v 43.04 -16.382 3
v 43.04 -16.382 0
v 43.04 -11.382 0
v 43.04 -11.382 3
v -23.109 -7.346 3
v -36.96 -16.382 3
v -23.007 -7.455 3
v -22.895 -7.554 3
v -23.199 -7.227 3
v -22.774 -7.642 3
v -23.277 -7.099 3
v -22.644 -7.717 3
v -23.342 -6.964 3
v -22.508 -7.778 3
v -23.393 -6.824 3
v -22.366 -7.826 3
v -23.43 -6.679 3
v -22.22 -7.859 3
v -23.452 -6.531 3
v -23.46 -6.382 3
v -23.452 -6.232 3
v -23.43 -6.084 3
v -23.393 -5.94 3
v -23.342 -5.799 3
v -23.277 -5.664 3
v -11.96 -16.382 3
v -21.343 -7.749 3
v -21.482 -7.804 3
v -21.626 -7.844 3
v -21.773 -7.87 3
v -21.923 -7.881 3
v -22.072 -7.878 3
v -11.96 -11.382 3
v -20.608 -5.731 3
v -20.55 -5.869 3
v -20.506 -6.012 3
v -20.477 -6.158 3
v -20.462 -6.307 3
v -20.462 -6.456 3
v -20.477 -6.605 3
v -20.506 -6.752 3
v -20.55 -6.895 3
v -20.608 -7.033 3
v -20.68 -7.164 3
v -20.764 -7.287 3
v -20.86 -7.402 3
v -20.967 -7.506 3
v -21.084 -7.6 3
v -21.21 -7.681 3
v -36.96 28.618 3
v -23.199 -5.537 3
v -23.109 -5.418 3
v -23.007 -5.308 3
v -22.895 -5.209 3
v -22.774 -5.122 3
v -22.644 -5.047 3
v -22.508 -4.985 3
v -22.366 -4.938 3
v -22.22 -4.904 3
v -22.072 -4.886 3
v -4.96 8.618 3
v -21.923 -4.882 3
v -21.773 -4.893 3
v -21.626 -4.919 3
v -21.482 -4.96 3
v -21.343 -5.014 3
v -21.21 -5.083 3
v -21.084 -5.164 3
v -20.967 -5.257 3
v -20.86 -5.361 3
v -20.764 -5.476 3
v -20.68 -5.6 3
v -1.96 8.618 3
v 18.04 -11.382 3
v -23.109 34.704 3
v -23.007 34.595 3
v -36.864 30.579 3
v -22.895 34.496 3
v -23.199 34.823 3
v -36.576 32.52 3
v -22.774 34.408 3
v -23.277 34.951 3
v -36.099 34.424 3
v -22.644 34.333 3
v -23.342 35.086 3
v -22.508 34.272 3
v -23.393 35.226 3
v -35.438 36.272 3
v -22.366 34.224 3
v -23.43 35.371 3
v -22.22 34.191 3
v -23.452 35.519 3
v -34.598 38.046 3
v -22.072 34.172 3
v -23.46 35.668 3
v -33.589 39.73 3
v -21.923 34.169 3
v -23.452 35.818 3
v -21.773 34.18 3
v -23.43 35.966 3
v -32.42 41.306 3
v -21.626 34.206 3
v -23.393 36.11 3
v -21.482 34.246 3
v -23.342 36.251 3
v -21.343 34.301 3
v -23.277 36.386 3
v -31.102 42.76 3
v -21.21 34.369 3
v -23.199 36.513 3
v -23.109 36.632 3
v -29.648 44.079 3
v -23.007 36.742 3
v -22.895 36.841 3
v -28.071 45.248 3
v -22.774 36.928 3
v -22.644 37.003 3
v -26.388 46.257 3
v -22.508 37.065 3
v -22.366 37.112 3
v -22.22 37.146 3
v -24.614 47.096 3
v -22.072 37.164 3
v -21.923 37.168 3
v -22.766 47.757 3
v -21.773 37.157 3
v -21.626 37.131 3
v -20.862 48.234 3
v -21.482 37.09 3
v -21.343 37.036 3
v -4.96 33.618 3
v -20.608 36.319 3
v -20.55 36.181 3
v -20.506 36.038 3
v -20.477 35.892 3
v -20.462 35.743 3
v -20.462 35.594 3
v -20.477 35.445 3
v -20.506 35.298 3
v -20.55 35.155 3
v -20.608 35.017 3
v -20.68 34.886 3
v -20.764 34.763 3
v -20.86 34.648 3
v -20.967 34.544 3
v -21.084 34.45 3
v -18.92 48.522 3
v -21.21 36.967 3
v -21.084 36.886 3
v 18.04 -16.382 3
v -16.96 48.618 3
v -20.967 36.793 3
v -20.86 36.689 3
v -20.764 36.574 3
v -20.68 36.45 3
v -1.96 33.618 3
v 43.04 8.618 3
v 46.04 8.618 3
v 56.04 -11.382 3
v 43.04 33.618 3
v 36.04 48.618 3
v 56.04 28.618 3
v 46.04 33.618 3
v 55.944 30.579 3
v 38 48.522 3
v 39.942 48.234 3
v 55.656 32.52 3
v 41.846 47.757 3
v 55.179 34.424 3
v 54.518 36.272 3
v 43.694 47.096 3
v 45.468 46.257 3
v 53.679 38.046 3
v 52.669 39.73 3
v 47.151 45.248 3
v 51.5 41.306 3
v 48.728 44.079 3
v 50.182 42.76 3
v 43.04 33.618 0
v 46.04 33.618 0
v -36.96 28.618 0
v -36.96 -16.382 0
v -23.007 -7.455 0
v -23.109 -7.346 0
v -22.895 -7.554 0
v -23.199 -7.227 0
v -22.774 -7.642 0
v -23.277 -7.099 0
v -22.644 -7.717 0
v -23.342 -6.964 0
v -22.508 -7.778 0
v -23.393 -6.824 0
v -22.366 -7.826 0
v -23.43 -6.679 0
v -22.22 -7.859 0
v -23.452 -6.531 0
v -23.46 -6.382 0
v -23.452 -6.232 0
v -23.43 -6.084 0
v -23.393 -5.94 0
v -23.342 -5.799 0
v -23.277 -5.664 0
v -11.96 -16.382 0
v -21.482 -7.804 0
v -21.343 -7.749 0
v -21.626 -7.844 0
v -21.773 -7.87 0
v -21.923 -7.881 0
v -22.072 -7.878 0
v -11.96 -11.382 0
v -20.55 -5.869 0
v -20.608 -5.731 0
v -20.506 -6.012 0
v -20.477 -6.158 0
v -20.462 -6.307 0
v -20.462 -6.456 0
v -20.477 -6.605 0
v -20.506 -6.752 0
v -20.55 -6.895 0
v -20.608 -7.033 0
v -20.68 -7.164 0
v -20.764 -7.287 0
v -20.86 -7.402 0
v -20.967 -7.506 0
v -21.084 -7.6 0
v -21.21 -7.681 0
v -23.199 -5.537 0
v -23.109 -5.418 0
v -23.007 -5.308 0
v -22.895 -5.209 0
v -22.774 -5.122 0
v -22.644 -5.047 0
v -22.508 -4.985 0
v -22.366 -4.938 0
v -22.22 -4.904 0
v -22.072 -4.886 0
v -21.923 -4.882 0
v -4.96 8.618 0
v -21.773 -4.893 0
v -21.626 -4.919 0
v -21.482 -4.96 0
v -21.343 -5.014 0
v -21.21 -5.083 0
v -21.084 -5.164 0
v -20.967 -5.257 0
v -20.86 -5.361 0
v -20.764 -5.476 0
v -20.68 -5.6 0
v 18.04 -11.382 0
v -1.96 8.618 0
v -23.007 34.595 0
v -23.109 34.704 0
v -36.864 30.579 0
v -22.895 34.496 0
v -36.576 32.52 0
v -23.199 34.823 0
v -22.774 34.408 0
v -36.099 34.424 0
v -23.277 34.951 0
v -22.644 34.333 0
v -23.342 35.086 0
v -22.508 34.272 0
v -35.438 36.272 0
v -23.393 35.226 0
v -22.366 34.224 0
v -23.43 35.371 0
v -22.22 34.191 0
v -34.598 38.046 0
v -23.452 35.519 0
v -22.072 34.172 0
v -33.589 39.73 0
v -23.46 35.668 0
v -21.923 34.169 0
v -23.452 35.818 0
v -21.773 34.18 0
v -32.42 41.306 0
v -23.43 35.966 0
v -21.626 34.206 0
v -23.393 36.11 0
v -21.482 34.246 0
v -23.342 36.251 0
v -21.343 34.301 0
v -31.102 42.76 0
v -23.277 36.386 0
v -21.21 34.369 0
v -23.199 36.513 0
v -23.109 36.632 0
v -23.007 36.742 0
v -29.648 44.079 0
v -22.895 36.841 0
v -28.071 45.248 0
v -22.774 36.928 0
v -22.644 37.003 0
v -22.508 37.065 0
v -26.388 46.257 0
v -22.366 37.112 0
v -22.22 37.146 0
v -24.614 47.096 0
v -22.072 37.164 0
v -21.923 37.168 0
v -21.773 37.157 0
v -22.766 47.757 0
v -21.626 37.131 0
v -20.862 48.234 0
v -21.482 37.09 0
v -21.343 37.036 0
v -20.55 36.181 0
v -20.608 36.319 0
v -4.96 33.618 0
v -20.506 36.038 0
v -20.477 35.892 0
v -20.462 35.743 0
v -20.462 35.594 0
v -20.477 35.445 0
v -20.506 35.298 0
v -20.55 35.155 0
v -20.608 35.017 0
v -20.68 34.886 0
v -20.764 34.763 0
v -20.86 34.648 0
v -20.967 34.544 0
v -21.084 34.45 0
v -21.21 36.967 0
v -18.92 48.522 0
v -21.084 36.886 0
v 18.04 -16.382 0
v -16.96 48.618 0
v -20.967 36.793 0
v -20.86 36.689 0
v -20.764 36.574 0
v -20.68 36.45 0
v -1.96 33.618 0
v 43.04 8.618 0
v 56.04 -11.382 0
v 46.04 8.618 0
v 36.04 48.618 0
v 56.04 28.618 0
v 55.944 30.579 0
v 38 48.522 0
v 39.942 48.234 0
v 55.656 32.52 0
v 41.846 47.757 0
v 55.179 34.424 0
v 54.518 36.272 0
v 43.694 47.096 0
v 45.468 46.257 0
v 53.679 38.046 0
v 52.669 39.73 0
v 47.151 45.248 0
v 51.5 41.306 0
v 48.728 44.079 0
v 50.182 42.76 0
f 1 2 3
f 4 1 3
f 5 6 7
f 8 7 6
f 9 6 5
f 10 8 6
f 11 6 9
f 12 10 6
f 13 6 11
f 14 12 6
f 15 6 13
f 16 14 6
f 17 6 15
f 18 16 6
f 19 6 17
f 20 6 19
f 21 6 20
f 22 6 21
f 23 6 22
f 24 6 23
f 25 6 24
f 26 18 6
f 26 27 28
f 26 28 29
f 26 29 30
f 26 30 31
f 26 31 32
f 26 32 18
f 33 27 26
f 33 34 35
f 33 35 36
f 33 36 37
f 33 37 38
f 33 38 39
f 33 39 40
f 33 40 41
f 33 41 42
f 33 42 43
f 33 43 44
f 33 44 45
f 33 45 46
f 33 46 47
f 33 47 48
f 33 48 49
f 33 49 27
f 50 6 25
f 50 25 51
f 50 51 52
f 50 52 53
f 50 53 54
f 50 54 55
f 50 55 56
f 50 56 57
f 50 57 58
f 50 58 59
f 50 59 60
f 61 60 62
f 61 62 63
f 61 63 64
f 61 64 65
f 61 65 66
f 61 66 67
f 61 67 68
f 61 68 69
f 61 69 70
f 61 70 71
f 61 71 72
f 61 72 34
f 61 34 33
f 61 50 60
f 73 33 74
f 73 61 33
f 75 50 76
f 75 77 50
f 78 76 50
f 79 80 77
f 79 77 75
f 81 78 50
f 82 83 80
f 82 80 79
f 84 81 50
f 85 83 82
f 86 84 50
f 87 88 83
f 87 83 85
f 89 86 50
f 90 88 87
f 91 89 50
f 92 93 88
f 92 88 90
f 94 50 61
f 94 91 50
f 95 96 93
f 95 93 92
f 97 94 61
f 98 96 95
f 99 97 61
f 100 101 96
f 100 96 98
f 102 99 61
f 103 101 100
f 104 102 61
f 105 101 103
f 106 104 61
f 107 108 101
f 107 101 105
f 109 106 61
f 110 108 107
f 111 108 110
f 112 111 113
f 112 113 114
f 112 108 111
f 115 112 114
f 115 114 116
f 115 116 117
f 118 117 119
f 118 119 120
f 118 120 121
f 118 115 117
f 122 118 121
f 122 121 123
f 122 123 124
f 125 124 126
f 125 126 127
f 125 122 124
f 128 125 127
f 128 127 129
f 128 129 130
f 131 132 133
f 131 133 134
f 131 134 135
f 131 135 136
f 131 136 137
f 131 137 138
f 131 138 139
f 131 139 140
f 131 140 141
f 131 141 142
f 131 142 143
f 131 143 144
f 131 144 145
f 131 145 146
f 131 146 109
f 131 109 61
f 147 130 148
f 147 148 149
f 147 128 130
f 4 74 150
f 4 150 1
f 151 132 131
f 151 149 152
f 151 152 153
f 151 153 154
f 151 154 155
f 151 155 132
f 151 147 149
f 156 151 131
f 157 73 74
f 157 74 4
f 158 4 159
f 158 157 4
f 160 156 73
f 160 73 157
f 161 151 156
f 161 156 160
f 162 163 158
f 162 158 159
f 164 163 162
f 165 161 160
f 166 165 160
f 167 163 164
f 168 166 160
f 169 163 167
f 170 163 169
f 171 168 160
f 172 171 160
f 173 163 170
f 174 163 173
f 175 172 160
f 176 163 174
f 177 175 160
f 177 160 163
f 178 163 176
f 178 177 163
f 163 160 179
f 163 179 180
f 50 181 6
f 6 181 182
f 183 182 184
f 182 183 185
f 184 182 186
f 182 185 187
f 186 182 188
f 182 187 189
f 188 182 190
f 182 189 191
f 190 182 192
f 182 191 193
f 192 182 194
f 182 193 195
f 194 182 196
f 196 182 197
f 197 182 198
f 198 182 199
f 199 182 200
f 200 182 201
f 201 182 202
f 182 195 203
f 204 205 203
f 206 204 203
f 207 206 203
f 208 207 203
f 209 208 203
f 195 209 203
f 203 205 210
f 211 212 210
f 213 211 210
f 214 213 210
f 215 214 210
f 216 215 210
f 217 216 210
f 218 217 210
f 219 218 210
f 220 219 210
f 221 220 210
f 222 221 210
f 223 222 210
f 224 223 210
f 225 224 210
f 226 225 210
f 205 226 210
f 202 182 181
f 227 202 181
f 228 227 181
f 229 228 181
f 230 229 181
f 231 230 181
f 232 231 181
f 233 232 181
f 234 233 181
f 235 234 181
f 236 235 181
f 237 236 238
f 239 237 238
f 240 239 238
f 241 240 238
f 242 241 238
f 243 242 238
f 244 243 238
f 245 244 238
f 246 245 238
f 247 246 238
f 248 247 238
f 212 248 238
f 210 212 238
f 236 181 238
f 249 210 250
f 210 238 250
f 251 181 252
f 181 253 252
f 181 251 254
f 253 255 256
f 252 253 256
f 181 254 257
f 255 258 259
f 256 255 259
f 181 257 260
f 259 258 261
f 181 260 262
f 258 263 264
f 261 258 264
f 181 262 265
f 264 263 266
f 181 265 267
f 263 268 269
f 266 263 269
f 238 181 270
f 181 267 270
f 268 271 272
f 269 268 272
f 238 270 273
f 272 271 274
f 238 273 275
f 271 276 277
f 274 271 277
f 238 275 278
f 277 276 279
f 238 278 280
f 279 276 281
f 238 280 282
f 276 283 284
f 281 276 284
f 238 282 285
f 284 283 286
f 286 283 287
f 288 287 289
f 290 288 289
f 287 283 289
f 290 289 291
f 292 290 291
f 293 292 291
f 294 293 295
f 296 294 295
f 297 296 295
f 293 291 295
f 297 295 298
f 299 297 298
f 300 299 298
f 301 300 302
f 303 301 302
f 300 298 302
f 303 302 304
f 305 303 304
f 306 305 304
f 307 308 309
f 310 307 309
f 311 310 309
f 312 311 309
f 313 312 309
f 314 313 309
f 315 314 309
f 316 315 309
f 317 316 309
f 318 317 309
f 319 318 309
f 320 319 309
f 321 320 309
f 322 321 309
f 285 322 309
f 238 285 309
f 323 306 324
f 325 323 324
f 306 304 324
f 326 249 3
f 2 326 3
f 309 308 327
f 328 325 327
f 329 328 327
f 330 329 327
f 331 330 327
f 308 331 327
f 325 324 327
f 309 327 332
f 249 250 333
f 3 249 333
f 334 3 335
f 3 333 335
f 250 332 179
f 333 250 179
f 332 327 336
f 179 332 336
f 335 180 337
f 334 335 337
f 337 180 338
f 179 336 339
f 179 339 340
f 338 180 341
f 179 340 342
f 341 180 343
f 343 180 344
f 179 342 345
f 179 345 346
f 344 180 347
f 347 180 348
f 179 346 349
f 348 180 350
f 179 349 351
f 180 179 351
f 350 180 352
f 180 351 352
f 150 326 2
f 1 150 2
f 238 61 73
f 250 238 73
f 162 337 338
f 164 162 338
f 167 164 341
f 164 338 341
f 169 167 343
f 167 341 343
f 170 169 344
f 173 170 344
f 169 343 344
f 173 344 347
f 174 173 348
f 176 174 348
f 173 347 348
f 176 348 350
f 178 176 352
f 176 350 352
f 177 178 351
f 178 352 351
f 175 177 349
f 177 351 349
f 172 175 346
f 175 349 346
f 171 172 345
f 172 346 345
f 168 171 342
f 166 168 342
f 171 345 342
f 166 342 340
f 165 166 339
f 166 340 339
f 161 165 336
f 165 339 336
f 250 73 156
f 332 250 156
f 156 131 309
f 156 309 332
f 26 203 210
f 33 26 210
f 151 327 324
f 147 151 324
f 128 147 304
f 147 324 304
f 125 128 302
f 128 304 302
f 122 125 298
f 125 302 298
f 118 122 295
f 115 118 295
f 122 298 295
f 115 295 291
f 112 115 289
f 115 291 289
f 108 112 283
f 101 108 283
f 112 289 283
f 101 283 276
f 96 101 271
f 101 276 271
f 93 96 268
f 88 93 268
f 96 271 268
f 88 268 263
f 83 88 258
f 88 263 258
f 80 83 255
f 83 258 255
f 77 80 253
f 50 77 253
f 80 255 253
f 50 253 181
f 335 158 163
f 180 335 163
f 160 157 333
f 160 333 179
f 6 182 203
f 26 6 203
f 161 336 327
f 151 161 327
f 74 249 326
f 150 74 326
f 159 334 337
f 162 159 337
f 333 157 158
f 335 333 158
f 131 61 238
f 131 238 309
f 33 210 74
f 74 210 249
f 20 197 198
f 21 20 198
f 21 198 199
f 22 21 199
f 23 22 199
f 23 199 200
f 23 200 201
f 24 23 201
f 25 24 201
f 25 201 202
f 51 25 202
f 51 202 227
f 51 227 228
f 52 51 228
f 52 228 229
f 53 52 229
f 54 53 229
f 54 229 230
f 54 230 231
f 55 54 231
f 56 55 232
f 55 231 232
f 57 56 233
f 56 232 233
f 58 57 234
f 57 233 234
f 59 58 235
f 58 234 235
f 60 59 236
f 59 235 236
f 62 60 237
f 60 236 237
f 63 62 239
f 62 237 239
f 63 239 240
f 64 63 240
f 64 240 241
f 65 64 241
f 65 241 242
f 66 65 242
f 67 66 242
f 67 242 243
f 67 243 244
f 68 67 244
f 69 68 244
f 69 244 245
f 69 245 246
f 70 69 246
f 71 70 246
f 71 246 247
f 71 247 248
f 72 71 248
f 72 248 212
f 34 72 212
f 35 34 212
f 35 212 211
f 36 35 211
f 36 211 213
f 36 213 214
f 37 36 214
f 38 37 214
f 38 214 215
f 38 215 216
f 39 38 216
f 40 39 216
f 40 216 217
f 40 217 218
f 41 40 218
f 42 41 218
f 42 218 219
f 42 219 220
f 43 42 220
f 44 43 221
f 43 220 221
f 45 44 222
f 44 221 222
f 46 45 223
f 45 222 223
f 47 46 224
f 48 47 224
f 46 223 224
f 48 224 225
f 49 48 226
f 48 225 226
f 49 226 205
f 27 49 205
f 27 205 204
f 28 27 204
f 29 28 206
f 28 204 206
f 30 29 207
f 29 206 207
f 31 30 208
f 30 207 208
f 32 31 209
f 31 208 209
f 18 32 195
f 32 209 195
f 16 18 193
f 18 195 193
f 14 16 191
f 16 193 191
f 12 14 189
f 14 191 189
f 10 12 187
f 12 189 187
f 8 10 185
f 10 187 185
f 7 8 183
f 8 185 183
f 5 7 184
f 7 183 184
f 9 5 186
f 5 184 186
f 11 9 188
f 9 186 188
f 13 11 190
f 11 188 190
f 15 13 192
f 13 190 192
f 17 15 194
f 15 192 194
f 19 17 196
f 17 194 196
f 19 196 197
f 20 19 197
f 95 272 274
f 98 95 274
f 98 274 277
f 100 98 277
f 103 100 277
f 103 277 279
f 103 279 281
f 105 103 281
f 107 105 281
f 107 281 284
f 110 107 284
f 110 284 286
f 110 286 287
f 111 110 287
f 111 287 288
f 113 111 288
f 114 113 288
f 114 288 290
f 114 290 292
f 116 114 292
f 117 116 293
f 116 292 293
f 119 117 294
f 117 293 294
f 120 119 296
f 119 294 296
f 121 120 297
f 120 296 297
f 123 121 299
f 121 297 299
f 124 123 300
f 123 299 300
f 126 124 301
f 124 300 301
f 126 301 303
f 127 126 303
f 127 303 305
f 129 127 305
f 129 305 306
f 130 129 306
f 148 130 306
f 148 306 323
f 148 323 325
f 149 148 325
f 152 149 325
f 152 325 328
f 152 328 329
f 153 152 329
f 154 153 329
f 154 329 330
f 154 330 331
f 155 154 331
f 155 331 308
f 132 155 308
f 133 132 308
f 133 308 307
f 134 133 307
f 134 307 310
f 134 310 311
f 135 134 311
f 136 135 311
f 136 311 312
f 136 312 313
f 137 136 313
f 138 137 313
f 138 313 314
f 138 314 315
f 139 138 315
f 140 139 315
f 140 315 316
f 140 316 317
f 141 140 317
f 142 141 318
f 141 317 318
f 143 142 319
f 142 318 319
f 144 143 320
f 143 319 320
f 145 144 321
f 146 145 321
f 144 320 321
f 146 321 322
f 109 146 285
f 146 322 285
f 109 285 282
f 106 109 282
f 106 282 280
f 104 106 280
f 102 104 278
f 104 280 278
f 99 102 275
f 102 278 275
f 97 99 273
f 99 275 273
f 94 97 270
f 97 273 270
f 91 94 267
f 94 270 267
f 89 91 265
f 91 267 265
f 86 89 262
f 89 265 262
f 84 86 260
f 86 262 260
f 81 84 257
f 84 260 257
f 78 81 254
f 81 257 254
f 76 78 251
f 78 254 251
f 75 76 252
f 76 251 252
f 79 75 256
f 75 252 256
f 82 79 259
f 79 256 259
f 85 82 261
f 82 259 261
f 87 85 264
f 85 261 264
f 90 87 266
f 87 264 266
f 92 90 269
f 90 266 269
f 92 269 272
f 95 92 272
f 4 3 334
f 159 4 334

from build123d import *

# Parameters (mm, degrees)
RESSALTO_EXTRUS_O1_DEPTH = 3
ESBO_O2_R                = 1.5
CORTE_EXTRUS_O1_DEPTH    = 10
ESBO_O3_W                = 3
ESBO_O3_H                = 25
CORTE_EXTRUS_O2_DEPTH    = 10


with BuildPart() as part:
    # Esboço1 → Ressalto-extrusão1 (new body)
    with BuildSketch(Plane.XY):
        with BuildLine():
            Line((43.040081042, -11.381695114), (56.040081042, -11.381695114))
            Line((56.040081042, -11.381695114), (56.040081042, 28.618304886))
            ThreePointArc((56.040081042, 28.618304886), (50.182216666, 42.76044051), (36.040081042, 48.618304886))
            Line((36.040081042, 48.618304886), (-16.959918958, 48.618304886))
            ThreePointArc((-16.959918958, 48.618304886), (-31.102054581, 42.76044051), (-36.959918958, 28.618304886))
            Line((-36.959918958, 28.618304886), (-36.959918958, -1.381695114))
            Line((-36.959918958, -1.381695114), (-36.959918958, -16.381695114))
            Line((-36.959918958, -16.381695114), (-11.959918958, -16.381695114))
            Line((-11.959918958, -16.381695114), (-11.959918958, -11.381695114))
            Line((-11.959918958, -11.381695114), (18.040081042, -11.381695114))
            Line((18.040081042, -11.381695114), (18.040081042, -16.381695114))
            Line((18.040081042, -16.381695114), (43.040081042, -16.381695114))
            Line((43.040081042, -16.381695114), (43.040081042, -11.381695114))
        make_face()
    extrude(amount=RESSALTO_EXTRUS_O1_DEPTH)

    # Esboço2 → Corte-extrusão1 (cut)
    with BuildSketch(Plane(origin=(0, 0, 0), x_dir=(-1, 0, 0), z_dir=(0, 0, -1))):
        with Locations((21.959918958, 35.668304886)):
            Circle(ESBO_O2_R)
        with Locations((21.959918958, -6.381695114)):
            Circle(ESBO_O2_R)
    extrude(amount=-CORTE_EXTRUS_O1_DEPTH, mode=Mode.SUBTRACT)

    # Esboço3 → Corte-extrusão2 (cut)
    with BuildSketch(Plane.XY.offset(3)):
        with Locations((-3.459918958, 21.118304886)):
            Rectangle(ESBO_O3_W, ESBO_O3_H)
        with Locations((44.540081042, 21.118304886)):
            Rectangle(ESBO_O3_W, ESBO_O3_H)
    extrude(amount=-CORTE_EXTRUS_O2_DEPTH, mode=Mode.SUBTRACT)


solid = part.part
